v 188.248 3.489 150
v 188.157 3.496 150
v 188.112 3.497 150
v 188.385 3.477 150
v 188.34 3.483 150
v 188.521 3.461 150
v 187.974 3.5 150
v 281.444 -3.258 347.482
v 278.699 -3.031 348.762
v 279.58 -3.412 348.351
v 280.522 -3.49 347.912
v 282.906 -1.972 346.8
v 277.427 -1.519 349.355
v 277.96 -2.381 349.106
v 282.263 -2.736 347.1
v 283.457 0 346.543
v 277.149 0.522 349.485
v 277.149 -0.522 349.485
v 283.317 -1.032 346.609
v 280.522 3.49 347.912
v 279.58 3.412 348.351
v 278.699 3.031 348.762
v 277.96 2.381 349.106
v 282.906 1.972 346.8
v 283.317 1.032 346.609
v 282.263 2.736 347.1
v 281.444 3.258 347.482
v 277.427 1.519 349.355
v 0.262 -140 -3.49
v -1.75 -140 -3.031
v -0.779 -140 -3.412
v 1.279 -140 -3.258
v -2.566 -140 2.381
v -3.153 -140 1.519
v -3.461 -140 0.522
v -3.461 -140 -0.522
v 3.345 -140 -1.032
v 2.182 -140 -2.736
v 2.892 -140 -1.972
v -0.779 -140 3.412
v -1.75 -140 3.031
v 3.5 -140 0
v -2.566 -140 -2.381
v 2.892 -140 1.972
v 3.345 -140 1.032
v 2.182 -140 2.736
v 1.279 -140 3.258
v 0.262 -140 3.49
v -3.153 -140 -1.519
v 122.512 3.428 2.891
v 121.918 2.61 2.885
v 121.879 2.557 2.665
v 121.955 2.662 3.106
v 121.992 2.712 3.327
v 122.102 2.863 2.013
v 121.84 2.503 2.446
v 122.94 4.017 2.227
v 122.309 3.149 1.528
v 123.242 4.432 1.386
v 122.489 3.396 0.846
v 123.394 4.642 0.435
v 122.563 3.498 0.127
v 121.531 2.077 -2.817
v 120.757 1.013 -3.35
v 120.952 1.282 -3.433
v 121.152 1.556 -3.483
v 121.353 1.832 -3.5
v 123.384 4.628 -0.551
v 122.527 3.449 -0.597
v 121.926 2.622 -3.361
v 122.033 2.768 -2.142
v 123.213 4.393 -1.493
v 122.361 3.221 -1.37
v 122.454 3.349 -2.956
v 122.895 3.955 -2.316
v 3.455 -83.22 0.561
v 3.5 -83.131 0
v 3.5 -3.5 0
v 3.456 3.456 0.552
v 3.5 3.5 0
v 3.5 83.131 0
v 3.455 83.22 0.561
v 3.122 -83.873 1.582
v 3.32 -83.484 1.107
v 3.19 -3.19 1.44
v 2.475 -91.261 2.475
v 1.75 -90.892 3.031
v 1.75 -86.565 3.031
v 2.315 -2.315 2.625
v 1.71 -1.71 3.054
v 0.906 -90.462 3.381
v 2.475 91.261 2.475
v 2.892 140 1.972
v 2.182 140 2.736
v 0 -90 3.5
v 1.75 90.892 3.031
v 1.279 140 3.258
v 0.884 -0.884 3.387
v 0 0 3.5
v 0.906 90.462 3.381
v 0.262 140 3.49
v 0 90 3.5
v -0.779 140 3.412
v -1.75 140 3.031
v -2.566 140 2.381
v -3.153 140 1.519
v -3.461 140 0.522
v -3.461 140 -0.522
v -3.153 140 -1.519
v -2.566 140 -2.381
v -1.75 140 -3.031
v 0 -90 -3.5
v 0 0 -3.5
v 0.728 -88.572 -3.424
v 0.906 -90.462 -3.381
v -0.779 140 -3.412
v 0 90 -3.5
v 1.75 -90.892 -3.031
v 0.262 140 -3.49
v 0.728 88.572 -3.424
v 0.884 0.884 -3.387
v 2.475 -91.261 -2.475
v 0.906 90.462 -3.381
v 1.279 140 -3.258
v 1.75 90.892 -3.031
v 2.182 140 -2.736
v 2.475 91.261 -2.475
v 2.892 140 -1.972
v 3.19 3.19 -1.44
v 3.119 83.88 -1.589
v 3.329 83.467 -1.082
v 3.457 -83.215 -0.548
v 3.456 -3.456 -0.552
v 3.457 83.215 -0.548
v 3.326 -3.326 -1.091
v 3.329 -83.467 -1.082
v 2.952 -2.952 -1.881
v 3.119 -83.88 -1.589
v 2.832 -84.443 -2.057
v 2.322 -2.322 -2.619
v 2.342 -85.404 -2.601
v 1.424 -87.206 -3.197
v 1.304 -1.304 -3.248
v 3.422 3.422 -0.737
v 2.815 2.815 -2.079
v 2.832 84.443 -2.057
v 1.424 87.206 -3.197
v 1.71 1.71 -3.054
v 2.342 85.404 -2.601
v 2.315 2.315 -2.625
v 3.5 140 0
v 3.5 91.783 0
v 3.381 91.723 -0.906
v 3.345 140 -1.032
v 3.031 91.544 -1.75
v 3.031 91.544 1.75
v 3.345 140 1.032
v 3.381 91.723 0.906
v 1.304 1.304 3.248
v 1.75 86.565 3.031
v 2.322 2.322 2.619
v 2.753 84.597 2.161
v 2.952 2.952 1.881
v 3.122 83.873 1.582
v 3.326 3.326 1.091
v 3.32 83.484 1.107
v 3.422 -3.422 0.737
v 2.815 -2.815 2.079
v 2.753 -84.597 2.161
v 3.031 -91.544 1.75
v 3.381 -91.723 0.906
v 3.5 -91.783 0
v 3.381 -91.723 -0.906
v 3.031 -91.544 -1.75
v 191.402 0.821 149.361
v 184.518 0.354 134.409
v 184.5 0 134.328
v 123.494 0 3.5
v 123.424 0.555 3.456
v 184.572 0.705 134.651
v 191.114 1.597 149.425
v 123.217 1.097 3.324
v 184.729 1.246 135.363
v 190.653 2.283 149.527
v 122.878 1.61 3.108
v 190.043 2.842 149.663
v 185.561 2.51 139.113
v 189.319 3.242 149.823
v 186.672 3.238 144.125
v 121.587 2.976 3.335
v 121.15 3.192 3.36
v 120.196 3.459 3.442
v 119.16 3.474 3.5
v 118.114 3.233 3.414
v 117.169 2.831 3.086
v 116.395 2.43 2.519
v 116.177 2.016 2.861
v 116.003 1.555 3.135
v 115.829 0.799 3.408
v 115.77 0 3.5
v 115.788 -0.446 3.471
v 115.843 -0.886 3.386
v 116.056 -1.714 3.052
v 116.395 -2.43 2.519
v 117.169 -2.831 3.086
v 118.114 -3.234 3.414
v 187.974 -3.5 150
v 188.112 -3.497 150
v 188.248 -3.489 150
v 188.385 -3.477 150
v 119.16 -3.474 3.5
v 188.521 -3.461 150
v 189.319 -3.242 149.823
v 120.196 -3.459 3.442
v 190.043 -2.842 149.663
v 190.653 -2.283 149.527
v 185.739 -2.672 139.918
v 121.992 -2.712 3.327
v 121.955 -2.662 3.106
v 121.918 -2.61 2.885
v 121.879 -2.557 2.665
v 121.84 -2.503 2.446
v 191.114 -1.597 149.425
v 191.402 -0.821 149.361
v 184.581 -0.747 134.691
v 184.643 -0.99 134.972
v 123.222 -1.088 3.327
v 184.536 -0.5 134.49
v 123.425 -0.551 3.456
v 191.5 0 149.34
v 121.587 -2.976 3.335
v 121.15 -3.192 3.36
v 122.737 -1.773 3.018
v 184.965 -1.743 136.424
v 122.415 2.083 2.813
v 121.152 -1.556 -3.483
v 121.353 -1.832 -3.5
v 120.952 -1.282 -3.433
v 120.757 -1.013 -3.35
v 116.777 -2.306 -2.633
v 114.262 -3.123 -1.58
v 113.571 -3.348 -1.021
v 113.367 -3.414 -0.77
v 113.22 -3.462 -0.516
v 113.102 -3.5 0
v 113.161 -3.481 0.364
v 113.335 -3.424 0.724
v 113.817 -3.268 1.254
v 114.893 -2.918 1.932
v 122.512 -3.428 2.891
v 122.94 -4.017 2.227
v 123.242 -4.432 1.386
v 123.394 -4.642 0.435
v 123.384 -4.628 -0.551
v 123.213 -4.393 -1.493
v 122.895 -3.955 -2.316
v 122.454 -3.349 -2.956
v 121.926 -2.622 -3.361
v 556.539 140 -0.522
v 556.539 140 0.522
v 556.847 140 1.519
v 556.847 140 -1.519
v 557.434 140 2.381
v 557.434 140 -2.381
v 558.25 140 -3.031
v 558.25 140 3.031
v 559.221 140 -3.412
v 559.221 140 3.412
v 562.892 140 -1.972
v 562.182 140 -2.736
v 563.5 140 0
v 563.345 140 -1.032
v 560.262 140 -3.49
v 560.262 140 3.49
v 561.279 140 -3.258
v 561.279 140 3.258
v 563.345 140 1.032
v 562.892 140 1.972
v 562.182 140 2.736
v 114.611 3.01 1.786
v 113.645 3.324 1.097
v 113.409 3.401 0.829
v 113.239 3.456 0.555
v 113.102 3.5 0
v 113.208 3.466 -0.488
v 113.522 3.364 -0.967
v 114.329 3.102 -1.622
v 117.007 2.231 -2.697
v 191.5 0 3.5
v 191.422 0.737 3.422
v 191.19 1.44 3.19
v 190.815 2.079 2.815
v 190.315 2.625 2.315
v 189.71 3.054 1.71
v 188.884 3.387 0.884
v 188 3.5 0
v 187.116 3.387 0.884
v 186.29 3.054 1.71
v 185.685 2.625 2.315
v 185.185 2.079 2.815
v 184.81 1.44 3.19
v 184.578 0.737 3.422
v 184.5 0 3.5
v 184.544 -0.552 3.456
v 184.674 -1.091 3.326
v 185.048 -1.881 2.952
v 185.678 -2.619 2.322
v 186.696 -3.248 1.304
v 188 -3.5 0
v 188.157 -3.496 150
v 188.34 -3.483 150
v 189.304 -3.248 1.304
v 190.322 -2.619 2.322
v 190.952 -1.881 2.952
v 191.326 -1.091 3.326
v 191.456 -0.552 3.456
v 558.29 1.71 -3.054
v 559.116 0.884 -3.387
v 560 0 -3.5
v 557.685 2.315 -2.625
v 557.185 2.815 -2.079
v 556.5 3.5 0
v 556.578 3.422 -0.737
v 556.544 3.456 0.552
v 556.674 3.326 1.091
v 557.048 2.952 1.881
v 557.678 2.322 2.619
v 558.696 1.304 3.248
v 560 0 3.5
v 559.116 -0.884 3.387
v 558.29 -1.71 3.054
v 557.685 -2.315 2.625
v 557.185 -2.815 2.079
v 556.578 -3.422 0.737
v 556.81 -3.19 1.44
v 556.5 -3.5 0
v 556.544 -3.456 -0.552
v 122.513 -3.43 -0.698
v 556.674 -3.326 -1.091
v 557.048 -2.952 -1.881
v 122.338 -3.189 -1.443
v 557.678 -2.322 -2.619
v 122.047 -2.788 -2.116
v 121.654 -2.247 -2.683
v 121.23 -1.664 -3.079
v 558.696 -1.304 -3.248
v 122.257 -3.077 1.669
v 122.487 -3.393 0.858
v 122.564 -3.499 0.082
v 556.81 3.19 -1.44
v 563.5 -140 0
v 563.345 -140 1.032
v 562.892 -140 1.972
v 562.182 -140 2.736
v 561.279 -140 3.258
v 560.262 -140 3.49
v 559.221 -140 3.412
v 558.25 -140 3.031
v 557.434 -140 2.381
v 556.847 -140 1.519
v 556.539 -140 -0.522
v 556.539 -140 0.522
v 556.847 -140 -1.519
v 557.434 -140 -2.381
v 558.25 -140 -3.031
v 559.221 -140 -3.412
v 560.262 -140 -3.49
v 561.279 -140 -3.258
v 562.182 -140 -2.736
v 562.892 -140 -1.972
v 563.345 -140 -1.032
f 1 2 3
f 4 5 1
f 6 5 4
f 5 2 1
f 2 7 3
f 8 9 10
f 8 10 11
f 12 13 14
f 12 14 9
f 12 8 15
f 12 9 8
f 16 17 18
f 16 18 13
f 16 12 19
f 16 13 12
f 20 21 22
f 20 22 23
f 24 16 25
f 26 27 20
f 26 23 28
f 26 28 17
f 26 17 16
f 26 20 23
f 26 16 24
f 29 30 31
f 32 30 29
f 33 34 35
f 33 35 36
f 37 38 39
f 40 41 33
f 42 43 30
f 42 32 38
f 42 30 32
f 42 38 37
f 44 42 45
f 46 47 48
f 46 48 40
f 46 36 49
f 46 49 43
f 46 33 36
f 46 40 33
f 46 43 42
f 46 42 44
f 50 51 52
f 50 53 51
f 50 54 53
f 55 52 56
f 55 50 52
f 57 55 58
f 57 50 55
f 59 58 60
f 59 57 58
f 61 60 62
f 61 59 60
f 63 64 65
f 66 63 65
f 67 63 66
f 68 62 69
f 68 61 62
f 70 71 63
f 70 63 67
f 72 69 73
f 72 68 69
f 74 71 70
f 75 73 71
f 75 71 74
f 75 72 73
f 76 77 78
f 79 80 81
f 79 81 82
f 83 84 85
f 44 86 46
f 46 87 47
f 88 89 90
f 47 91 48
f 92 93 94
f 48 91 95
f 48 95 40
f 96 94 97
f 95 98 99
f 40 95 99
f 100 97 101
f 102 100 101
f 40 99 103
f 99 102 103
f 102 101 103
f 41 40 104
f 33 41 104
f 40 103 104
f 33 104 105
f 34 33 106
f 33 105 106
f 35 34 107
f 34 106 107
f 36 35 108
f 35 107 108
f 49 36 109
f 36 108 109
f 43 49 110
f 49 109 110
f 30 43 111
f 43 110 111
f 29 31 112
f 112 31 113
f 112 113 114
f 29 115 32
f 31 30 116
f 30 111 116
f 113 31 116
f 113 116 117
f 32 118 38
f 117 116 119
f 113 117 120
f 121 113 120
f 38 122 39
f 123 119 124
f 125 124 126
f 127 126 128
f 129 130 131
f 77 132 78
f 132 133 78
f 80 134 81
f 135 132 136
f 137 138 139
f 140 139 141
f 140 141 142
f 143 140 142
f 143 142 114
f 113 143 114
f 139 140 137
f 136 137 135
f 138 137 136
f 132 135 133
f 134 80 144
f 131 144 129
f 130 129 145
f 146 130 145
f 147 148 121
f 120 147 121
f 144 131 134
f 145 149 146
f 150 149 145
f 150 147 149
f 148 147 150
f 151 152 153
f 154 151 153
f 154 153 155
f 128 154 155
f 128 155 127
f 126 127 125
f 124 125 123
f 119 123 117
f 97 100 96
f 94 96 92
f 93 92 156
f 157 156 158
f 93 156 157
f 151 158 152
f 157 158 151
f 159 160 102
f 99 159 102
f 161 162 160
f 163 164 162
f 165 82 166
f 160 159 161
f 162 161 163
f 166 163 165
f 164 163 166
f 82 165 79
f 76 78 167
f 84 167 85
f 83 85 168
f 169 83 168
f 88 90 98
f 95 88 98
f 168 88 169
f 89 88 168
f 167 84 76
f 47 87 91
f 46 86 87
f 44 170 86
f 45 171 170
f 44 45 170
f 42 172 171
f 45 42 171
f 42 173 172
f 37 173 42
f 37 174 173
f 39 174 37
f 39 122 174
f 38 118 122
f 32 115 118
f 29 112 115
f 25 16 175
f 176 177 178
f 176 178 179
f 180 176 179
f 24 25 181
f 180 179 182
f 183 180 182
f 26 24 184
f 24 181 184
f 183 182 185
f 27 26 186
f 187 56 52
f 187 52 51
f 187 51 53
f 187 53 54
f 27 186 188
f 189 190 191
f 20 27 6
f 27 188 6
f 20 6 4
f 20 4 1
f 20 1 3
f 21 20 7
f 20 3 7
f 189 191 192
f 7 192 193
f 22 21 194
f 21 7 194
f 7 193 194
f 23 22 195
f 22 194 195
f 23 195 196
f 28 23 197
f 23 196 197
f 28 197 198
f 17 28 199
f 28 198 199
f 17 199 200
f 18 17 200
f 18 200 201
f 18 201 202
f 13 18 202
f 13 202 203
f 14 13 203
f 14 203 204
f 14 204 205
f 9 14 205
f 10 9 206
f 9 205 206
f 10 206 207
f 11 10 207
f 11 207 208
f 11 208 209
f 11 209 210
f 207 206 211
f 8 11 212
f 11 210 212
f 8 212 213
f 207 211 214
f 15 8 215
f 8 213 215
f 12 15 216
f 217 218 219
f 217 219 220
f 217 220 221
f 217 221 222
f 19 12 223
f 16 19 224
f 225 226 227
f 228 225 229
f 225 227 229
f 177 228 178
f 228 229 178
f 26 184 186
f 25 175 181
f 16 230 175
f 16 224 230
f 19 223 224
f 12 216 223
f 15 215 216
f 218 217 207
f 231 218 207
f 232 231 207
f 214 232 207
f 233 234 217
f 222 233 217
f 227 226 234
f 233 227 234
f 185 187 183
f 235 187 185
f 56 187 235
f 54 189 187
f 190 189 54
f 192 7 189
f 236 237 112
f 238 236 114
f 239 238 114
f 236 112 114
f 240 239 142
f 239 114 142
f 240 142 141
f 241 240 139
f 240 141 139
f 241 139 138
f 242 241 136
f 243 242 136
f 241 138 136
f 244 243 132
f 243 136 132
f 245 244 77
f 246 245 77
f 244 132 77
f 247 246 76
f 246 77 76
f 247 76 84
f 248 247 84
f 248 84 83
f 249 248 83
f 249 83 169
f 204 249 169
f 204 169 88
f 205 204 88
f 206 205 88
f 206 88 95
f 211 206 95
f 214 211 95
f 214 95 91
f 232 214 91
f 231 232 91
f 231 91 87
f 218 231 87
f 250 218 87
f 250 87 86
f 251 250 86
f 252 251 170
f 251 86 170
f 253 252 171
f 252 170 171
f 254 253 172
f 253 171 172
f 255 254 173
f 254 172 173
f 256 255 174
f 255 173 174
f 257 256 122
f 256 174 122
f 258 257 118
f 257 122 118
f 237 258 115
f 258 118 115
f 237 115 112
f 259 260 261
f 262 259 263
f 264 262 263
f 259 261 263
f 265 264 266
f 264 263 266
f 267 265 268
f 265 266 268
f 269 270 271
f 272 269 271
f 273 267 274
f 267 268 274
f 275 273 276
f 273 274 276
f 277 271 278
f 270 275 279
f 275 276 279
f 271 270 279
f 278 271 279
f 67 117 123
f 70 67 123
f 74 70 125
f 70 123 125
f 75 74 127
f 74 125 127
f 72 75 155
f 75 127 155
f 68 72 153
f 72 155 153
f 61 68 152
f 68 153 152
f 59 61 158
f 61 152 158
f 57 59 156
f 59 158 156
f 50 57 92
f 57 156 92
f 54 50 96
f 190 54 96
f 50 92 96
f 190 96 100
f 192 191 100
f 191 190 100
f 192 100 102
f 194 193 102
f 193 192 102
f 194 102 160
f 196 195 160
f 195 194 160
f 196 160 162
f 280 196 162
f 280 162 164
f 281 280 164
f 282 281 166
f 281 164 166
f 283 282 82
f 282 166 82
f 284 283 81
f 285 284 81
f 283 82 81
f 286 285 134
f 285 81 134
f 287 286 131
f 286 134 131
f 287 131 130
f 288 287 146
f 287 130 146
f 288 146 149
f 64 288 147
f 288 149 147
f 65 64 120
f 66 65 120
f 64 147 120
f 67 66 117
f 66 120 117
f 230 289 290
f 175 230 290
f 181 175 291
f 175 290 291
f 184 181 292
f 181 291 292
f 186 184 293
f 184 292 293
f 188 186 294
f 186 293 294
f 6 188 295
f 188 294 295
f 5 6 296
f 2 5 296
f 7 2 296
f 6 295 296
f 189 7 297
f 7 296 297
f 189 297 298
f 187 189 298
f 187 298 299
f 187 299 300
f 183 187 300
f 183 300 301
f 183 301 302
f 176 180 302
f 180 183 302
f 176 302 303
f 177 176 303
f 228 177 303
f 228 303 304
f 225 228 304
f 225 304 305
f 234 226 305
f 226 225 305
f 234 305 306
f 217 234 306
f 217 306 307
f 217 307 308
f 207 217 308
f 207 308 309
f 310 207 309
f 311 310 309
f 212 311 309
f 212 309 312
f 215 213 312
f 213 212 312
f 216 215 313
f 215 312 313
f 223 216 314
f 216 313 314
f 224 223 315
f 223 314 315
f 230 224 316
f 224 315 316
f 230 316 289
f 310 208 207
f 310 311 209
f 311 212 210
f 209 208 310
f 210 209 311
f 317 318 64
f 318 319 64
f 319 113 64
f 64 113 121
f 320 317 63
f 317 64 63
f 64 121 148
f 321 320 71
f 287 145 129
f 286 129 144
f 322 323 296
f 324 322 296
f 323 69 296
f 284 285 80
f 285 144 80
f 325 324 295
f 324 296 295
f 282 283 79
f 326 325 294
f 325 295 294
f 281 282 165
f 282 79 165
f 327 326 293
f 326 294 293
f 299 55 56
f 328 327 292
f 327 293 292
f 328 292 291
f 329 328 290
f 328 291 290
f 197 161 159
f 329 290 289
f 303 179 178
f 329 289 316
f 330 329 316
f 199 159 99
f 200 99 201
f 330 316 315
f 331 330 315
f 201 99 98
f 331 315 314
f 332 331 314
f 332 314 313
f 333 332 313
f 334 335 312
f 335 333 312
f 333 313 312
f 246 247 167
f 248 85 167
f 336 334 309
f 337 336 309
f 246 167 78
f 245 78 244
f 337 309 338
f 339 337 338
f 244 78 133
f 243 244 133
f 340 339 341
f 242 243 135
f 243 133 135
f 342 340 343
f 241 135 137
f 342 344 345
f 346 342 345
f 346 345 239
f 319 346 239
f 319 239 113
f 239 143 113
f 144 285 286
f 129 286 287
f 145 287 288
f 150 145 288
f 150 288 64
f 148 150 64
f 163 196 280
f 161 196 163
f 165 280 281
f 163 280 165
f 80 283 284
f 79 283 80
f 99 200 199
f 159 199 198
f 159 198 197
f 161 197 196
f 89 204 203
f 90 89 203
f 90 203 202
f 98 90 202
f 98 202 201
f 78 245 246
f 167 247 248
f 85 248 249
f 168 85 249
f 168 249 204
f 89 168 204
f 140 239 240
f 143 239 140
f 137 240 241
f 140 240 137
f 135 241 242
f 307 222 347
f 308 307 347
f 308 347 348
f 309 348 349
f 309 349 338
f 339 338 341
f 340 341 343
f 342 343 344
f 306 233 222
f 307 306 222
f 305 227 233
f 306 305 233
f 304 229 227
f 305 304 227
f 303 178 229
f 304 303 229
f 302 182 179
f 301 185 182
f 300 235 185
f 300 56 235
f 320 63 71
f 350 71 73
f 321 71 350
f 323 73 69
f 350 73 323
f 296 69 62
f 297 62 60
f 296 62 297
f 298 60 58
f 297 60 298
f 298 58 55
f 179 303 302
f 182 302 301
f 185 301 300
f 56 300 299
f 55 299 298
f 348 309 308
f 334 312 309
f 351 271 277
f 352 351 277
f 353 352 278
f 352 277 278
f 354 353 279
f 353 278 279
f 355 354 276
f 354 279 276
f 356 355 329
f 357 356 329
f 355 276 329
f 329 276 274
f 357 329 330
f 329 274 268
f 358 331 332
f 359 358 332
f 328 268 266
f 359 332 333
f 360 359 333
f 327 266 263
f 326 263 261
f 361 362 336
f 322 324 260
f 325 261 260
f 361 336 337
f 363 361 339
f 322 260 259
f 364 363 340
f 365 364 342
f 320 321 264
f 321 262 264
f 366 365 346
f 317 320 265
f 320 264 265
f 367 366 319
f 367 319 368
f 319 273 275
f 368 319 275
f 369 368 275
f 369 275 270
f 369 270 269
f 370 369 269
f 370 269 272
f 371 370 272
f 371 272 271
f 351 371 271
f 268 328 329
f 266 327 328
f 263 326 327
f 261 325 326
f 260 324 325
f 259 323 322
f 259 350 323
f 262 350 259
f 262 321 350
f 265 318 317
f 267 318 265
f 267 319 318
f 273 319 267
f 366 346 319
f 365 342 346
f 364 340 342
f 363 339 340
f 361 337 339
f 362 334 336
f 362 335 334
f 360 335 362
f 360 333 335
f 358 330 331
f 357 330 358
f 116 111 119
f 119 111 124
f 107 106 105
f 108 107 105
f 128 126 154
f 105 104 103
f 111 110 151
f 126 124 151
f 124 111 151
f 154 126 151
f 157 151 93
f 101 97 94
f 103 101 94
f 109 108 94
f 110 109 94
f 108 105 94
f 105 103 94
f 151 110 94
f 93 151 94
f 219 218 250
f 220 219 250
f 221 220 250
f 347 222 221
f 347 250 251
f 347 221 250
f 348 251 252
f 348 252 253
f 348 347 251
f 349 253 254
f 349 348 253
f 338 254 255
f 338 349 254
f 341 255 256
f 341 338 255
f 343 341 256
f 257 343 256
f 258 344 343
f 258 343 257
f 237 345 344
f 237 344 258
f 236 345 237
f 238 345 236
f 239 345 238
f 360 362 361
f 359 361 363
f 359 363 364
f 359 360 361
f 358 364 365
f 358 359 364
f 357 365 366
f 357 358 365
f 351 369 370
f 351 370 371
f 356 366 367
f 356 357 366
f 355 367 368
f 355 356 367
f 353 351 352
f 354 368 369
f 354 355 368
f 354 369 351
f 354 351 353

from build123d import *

# Parameters (mm, degrees)
CYLINDER001_R               = 3.5
CYLINDER001_DEPTH           = 280
CYLINDER001_ROLL_ANGLE      = 90
CYLINDER003_R               = 3.5
CYLINDER003_DEPTH           = 150
CYLINDER003_PITCH_ANGLE     = 90
CYLINDER003_PLACEMENT_ANGLE = 36
CYLINDER002_R               = 3.5
CYLINDER002_DEPTH           = 280
CYLINDER002_ROLL_ANGLE      = 90
CYLINDER004_R               = 3.5
CYLINDER004_DEPTH           = 150
CYLINDER004_PITCH_ANGLE     = 90
CYLINDER004_PLACEMENT_ANGLE = -36
CYLINDER005_R               = 3.5
CYLINDER005_DEPTH           = 150
CYLINDER006_R               = 3.5
CYLINDER006_DEPTH           = 384
CYLINDER006_PLACEMENT_ANGLE = 25
CYLINDER_R                  = 3.5
CYLINDER_DEPTH              = 560
CYLINDER_PITCH_ANGLE        = 90


with BuildPart() as eje_ruedas_traseras:
    # Cylinder001 → Cylinder001 (new body)
    with BuildSketch(Plane.XY):
        Circle(CYLINDER001_R)
    extrude(amount=CYLINDER001_DEPTH)


with BuildPart() as eje_ruedas_traseras_1:
    # Cylinder001 roll: moved
    add(eje_ruedas_traseras.part.rotate(Axis((0, 0, 0), (1, 0, 0)), CYLINDER001_ROLL_ANGLE))


with BuildPart() as eje_ruedas_traseras_2:
    # Cylinder001 placement: moved
    add(eje_ruedas_traseras_1.part.moved(Location((0, 140, 0))))


with BuildPart() as soporte_derecho:
    # Cylinder003 → Cylinder003 (new body)
    with BuildSketch(Plane.XY):
        Circle(CYLINDER003_R)
    extrude(amount=CYLINDER003_DEPTH)


with BuildPart() as soporte_derecho_1:
    # Cylinder003 pitch: moved
    add(soporte_derecho.part.rotate(Axis((0, 0, 0), (0, 1, 0)), CYLINDER003_PITCH_ANGLE))


with BuildPart() as soporte_derecho_2:
    # Cylinder003 placement: moved
    add(soporte_derecho_1.part.moved(Location((0, -90, 0))).rotate(Axis((0, -90, 0), (0, 0, 1)), CYLINDER003_PLACEMENT_ANGLE))


with BuildPart() as eje_ruedas_delanteras:
    # Cylinder002 → Cylinder002 (new body)
    with BuildSketch(Plane.XY):
        Circle(CYLINDER002_R)
    extrude(amount=CYLINDER002_DEPTH)


with BuildPart() as eje_ruedas_delanteras_1:
    # Cylinder002 roll: moved
    add(eje_ruedas_delanteras.part.rotate(Axis((0, 0, 0), (1, 0, 0)), CYLINDER002_ROLL_ANGLE))


with BuildPart() as eje_ruedas_delanteras_2:
    # Cylinder002 placement: moved
    add(eje_ruedas_delanteras_1.part.moved(Location((560, 140, 0))))


with BuildPart() as soporte_izquierdo:
    # Cylinder004 → Cylinder004 (new body)
    with BuildSketch(Plane.XY):
        Circle(CYLINDER004_R)
    extrude(amount=CYLINDER004_DEPTH)


with BuildPart() as soporte_izquierdo_1:
    # Cylinder004 pitch: moved
    add(soporte_izquierdo.part.rotate(Axis((0, 0, 0), (0, 1, 0)), CYLINDER004_PITCH_ANGLE))


with BuildPart() as soporte_izquierdo_2:
    # Cylinder004 placement: moved
    add(soporte_izquierdo_1.part.moved(Location((0, 90, 0))).rotate(Axis((0, 90, 0), (0, 0, 1)), CYLINDER004_PLACEMENT_ANGLE))


with BuildPart() as soporte_mastil:
    # Cylinder005 → Cylinder005 (new body)
    with BuildSketch(Plane(origin=(188, 0, 0), x_dir=(1, 0, 0), z_dir=(0, 0, 1))):
        Circle(CYLINDER005_R)
    extrude(amount=CYLINDER005_DEPTH)


with BuildPart() as mastil:
    # Cylinder006 → Cylinder006 (new body)
    with BuildSketch(Plane.XY):
        Circle(CYLINDER006_R)
    extrude(amount=CYLINDER006_DEPTH)


with BuildPart() as mastil_1:
    # Cylinder006 placement: moved
    add(mastil.part.moved(Location((118, 0, 0))).rotate(Axis((118, 0, 0), (0, 1, 0)), CYLINDER006_PLACEMENT_ANGLE))


with BuildPart() as estructura_exo:
    # Cylinder → Cylinder (new body)
    with BuildSketch(Plane.XY):
        Circle(CYLINDER_R)
    extrude(amount=CYLINDER_DEPTH)


with BuildPart() as estructura_exo_1:
    # Cylinder pitch: moved
    add(estructura_exo.part.rotate(Axis((0, 0, 0), (0, 1, 0)), CYLINDER_PITCH_ANGLE))


with BuildPart() as estructura_exo_2:
    # Cylinder placement: moved
    add(estructura_exo_1.part)

    # Fusion: union Eje Ruedas traseras, Soporte Derecho, Eje Ruedas delanteras, Soporte Izquierdo, Soporte Mastil, Mastil
    add(eje_ruedas_traseras_2.part)
    add(soporte_derecho_2.part)
    add(eje_ruedas_delanteras_2.part)
    add(soporte_izquierdo_2.part)
    add(soporte_mastil.part)
    add(mastil_1.part)


solid = estructura_exo_2.part
